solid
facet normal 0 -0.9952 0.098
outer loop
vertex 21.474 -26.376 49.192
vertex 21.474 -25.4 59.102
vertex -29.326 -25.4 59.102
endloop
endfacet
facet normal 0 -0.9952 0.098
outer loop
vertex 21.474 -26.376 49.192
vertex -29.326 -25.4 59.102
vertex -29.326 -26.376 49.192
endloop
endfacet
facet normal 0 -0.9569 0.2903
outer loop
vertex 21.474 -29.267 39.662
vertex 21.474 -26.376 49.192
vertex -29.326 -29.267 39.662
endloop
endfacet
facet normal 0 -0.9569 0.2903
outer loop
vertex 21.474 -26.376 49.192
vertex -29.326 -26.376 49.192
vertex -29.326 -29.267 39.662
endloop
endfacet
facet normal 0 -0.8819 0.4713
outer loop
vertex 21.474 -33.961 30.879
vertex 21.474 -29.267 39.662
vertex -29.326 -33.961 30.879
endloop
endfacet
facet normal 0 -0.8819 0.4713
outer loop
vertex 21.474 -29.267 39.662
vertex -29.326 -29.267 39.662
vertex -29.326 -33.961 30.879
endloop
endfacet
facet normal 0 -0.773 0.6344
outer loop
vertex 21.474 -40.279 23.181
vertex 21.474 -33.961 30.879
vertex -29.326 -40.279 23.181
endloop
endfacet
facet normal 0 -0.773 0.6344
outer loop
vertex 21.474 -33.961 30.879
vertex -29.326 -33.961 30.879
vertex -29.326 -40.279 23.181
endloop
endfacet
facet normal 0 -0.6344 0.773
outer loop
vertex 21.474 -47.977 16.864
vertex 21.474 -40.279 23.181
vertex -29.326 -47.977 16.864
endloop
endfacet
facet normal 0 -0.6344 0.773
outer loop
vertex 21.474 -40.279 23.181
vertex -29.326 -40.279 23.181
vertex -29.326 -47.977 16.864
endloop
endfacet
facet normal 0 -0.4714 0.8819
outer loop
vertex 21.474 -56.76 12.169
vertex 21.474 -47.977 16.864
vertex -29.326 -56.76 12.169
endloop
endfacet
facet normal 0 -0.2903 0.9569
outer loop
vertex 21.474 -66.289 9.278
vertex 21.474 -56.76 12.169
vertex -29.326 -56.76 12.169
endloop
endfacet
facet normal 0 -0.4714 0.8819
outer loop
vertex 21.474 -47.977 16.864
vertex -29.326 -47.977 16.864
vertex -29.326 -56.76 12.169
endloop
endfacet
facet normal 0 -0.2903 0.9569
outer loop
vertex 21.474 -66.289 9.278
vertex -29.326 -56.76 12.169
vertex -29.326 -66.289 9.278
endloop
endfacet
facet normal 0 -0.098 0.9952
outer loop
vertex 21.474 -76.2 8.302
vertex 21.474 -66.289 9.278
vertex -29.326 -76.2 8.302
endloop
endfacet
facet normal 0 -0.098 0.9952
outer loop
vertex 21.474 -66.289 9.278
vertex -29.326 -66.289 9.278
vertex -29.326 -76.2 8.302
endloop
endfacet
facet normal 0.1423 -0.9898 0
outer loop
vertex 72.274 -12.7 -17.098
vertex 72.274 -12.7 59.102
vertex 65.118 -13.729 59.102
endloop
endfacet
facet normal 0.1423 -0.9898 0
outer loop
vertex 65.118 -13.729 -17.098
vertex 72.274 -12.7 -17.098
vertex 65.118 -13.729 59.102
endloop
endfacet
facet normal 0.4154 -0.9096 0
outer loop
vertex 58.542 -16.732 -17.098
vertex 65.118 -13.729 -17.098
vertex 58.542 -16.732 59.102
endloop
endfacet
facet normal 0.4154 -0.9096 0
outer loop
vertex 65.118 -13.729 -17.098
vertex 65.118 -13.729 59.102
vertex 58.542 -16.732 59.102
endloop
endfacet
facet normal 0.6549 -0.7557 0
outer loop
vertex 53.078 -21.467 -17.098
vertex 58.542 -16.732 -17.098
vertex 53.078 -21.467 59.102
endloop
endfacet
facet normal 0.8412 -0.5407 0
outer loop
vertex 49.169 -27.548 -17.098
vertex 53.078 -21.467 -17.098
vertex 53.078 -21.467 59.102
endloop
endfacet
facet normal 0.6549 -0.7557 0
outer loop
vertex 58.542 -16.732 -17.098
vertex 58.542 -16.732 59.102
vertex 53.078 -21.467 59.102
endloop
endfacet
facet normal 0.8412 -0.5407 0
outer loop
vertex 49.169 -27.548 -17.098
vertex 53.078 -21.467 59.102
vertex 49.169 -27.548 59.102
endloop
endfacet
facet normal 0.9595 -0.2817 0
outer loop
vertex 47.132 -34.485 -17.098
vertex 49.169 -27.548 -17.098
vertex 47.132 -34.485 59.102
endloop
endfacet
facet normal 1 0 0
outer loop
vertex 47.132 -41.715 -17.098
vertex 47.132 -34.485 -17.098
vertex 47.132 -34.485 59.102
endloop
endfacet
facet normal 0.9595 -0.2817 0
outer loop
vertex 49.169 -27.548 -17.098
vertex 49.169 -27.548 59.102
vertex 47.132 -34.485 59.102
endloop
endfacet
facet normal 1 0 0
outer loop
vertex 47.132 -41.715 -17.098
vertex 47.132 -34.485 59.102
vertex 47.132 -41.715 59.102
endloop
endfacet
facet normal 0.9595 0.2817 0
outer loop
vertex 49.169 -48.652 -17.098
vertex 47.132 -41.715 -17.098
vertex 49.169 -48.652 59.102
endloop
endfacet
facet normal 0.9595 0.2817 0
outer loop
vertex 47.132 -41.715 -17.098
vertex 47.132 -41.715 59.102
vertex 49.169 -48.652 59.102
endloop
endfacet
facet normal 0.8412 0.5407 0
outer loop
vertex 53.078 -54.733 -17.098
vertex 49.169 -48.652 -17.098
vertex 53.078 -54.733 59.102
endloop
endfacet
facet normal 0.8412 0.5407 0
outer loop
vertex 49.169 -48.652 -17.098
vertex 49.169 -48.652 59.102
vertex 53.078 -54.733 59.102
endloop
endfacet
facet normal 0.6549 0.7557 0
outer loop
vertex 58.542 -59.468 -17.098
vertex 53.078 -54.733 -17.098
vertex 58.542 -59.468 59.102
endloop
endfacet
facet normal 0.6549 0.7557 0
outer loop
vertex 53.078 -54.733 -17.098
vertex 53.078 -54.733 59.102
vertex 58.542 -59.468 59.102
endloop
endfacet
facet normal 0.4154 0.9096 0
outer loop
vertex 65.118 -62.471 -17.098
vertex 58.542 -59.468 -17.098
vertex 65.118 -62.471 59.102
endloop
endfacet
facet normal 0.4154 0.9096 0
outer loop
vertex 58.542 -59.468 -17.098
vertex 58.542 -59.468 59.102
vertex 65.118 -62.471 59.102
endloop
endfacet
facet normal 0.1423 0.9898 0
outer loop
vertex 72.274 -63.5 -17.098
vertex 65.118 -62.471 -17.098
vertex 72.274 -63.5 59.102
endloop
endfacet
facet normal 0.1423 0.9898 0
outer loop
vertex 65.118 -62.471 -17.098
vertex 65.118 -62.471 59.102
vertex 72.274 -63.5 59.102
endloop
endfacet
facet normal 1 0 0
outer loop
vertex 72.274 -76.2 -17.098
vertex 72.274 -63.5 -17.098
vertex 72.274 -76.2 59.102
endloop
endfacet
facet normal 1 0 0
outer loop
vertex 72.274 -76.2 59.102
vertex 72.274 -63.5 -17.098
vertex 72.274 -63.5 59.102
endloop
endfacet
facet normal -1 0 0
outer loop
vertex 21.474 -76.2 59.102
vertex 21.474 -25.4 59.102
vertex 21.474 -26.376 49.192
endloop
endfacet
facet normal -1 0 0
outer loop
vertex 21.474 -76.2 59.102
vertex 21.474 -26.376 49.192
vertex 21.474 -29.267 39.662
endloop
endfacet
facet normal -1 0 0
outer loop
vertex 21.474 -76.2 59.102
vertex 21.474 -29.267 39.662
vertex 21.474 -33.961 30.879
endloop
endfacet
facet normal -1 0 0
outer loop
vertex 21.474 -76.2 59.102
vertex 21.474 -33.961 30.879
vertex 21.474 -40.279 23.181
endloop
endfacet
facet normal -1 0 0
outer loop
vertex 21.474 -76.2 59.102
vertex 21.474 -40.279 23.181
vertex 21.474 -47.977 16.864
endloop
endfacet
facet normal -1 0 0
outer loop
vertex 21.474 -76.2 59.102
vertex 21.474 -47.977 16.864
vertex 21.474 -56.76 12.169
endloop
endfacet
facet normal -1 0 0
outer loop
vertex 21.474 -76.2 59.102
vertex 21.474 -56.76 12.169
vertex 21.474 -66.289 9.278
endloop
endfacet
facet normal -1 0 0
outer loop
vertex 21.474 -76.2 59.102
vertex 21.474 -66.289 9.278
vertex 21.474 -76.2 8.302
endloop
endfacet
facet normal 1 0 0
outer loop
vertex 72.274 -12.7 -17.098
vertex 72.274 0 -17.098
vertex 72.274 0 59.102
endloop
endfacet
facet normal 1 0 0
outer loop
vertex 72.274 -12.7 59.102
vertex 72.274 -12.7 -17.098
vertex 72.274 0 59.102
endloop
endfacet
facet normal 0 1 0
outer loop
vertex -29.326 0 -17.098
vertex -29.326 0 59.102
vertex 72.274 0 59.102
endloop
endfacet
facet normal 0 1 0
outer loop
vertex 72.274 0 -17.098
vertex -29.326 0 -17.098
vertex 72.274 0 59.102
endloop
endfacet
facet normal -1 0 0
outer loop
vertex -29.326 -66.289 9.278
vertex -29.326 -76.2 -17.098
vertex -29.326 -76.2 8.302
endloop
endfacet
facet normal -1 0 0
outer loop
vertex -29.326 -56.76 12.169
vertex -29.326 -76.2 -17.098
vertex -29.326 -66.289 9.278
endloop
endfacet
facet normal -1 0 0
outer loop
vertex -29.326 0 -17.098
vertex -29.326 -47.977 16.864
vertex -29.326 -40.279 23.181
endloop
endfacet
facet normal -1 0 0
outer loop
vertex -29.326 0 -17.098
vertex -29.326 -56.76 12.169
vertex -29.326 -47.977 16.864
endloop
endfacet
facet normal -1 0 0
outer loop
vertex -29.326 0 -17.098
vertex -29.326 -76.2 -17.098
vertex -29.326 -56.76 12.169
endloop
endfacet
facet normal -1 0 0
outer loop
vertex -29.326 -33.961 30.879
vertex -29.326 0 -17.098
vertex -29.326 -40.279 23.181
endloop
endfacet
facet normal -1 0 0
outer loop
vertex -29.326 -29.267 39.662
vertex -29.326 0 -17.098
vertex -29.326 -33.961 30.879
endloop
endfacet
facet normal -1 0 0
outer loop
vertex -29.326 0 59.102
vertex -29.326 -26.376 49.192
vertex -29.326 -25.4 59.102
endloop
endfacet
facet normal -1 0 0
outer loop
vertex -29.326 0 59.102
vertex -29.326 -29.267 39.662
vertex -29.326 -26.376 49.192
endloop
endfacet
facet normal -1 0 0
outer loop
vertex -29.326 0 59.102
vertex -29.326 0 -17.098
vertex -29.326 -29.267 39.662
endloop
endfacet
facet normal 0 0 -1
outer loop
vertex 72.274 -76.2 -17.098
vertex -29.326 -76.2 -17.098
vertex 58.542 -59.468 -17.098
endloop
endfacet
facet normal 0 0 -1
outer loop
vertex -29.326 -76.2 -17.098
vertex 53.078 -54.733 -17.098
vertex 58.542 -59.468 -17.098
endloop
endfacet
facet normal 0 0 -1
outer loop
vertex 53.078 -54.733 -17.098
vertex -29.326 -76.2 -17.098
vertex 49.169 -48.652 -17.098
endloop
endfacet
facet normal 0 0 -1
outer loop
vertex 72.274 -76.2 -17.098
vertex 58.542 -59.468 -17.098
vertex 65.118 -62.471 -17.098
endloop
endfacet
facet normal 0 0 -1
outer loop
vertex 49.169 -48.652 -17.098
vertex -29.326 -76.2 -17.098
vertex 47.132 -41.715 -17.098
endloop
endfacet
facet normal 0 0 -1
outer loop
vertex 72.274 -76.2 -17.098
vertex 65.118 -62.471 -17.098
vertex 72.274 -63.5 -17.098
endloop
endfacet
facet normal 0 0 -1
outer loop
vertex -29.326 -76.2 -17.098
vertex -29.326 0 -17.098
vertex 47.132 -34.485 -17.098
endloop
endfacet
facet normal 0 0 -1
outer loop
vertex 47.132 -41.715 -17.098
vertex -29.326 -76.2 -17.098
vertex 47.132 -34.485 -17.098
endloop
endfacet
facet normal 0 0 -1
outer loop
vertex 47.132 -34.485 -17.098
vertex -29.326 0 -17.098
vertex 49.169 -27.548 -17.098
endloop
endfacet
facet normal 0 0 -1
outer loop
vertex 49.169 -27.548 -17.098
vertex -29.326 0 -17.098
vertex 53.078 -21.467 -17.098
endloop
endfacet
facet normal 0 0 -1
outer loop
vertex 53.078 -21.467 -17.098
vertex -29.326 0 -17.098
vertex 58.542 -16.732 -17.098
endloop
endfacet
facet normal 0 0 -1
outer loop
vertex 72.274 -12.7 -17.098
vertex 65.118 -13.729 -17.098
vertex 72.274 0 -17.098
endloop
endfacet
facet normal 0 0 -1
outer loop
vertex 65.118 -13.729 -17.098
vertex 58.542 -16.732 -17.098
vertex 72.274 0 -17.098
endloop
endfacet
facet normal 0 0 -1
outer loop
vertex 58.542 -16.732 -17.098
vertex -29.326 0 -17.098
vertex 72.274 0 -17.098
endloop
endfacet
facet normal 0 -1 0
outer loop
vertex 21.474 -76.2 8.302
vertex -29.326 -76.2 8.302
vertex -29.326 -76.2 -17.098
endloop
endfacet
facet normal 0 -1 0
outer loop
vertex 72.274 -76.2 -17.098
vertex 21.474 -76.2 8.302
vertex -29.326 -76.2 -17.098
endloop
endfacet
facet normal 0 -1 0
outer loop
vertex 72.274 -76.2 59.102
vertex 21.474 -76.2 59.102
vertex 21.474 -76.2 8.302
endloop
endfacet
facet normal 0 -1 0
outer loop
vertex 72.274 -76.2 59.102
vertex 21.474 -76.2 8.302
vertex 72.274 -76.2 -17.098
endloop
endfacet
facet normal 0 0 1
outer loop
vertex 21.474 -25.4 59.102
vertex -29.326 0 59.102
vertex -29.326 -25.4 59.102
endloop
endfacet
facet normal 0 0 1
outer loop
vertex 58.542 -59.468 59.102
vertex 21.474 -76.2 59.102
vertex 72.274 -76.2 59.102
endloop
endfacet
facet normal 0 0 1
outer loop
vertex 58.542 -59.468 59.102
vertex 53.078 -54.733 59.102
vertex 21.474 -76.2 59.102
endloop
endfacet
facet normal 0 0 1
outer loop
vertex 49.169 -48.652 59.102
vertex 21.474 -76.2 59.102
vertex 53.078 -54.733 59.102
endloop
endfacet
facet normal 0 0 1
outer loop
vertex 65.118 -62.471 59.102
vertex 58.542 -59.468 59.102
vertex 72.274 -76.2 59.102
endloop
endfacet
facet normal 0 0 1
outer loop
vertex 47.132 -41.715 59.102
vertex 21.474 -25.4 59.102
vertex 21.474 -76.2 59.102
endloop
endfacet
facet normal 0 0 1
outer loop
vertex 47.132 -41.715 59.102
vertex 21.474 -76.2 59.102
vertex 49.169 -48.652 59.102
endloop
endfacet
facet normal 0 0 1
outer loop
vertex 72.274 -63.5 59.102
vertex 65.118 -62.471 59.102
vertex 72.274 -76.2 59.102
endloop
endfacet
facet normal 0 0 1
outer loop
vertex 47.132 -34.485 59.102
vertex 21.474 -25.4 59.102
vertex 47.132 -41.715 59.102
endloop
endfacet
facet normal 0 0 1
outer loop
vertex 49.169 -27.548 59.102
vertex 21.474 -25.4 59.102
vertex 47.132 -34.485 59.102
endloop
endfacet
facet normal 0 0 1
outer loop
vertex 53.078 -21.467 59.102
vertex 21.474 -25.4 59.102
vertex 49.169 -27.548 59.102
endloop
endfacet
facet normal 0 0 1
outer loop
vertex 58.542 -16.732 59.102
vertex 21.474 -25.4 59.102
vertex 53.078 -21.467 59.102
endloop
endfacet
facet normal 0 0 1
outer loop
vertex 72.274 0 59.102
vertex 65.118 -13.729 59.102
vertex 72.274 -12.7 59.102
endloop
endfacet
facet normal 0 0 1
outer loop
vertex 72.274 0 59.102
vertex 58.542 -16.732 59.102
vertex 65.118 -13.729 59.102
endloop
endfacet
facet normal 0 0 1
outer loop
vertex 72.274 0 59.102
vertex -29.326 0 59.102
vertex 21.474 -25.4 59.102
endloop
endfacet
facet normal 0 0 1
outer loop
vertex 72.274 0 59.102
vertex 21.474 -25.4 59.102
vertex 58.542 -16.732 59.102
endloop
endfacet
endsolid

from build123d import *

# Parameters (mm, degrees)
F0_W     = 101.6
F0_H     = 76.2
F1_DEPTH = 76.2
F3_DEPTH = 76.201
F5_DEPTH = 50.8


with BuildPart() as f1:
    # F0 (on Front) → F1 (new body)
    with BuildSketch(Plane.XZ):
        with Locations((21.473836, 21.002229)):
            Rectangle(F0_W, F0_H)
    extrude(amount=F1_DEPTH)

    # F2 (on face) → F3 (cut, through all)
    with BuildSketch(Plane.XY.offset(59.102229)):
        with BuildLine():
            Line((72.273836, -63.5), (72.273836, -12.7))
            ThreePointArc((72.273836, -12.7), (46.873836, -38.1), (72.273836, -63.5))
        make_face()
    extrude(amount=-F3_DEPTH, mode=Mode.SUBTRACT)

    # F4 (on face) → F5 (cut)
    with BuildSketch(Plane(origin=(-29.326164, 0, 0), x_dir=(0, -1, 0), z_dir=(-1, 0, 0))):
        with BuildLine():
            Line((76.2, 59.102229), (25.4, 59.102229))
            ThreePointArc((25.4, 59.102229), (40.278976, 23.181204), (76.2, 8.302229))
            Line((76.2, 8.302229), (76.2, 59.102229))
        make_face()
    extrude(amount=-F5_DEPTH, mode=Mode.SUBTRACT)


solid = f1.part
